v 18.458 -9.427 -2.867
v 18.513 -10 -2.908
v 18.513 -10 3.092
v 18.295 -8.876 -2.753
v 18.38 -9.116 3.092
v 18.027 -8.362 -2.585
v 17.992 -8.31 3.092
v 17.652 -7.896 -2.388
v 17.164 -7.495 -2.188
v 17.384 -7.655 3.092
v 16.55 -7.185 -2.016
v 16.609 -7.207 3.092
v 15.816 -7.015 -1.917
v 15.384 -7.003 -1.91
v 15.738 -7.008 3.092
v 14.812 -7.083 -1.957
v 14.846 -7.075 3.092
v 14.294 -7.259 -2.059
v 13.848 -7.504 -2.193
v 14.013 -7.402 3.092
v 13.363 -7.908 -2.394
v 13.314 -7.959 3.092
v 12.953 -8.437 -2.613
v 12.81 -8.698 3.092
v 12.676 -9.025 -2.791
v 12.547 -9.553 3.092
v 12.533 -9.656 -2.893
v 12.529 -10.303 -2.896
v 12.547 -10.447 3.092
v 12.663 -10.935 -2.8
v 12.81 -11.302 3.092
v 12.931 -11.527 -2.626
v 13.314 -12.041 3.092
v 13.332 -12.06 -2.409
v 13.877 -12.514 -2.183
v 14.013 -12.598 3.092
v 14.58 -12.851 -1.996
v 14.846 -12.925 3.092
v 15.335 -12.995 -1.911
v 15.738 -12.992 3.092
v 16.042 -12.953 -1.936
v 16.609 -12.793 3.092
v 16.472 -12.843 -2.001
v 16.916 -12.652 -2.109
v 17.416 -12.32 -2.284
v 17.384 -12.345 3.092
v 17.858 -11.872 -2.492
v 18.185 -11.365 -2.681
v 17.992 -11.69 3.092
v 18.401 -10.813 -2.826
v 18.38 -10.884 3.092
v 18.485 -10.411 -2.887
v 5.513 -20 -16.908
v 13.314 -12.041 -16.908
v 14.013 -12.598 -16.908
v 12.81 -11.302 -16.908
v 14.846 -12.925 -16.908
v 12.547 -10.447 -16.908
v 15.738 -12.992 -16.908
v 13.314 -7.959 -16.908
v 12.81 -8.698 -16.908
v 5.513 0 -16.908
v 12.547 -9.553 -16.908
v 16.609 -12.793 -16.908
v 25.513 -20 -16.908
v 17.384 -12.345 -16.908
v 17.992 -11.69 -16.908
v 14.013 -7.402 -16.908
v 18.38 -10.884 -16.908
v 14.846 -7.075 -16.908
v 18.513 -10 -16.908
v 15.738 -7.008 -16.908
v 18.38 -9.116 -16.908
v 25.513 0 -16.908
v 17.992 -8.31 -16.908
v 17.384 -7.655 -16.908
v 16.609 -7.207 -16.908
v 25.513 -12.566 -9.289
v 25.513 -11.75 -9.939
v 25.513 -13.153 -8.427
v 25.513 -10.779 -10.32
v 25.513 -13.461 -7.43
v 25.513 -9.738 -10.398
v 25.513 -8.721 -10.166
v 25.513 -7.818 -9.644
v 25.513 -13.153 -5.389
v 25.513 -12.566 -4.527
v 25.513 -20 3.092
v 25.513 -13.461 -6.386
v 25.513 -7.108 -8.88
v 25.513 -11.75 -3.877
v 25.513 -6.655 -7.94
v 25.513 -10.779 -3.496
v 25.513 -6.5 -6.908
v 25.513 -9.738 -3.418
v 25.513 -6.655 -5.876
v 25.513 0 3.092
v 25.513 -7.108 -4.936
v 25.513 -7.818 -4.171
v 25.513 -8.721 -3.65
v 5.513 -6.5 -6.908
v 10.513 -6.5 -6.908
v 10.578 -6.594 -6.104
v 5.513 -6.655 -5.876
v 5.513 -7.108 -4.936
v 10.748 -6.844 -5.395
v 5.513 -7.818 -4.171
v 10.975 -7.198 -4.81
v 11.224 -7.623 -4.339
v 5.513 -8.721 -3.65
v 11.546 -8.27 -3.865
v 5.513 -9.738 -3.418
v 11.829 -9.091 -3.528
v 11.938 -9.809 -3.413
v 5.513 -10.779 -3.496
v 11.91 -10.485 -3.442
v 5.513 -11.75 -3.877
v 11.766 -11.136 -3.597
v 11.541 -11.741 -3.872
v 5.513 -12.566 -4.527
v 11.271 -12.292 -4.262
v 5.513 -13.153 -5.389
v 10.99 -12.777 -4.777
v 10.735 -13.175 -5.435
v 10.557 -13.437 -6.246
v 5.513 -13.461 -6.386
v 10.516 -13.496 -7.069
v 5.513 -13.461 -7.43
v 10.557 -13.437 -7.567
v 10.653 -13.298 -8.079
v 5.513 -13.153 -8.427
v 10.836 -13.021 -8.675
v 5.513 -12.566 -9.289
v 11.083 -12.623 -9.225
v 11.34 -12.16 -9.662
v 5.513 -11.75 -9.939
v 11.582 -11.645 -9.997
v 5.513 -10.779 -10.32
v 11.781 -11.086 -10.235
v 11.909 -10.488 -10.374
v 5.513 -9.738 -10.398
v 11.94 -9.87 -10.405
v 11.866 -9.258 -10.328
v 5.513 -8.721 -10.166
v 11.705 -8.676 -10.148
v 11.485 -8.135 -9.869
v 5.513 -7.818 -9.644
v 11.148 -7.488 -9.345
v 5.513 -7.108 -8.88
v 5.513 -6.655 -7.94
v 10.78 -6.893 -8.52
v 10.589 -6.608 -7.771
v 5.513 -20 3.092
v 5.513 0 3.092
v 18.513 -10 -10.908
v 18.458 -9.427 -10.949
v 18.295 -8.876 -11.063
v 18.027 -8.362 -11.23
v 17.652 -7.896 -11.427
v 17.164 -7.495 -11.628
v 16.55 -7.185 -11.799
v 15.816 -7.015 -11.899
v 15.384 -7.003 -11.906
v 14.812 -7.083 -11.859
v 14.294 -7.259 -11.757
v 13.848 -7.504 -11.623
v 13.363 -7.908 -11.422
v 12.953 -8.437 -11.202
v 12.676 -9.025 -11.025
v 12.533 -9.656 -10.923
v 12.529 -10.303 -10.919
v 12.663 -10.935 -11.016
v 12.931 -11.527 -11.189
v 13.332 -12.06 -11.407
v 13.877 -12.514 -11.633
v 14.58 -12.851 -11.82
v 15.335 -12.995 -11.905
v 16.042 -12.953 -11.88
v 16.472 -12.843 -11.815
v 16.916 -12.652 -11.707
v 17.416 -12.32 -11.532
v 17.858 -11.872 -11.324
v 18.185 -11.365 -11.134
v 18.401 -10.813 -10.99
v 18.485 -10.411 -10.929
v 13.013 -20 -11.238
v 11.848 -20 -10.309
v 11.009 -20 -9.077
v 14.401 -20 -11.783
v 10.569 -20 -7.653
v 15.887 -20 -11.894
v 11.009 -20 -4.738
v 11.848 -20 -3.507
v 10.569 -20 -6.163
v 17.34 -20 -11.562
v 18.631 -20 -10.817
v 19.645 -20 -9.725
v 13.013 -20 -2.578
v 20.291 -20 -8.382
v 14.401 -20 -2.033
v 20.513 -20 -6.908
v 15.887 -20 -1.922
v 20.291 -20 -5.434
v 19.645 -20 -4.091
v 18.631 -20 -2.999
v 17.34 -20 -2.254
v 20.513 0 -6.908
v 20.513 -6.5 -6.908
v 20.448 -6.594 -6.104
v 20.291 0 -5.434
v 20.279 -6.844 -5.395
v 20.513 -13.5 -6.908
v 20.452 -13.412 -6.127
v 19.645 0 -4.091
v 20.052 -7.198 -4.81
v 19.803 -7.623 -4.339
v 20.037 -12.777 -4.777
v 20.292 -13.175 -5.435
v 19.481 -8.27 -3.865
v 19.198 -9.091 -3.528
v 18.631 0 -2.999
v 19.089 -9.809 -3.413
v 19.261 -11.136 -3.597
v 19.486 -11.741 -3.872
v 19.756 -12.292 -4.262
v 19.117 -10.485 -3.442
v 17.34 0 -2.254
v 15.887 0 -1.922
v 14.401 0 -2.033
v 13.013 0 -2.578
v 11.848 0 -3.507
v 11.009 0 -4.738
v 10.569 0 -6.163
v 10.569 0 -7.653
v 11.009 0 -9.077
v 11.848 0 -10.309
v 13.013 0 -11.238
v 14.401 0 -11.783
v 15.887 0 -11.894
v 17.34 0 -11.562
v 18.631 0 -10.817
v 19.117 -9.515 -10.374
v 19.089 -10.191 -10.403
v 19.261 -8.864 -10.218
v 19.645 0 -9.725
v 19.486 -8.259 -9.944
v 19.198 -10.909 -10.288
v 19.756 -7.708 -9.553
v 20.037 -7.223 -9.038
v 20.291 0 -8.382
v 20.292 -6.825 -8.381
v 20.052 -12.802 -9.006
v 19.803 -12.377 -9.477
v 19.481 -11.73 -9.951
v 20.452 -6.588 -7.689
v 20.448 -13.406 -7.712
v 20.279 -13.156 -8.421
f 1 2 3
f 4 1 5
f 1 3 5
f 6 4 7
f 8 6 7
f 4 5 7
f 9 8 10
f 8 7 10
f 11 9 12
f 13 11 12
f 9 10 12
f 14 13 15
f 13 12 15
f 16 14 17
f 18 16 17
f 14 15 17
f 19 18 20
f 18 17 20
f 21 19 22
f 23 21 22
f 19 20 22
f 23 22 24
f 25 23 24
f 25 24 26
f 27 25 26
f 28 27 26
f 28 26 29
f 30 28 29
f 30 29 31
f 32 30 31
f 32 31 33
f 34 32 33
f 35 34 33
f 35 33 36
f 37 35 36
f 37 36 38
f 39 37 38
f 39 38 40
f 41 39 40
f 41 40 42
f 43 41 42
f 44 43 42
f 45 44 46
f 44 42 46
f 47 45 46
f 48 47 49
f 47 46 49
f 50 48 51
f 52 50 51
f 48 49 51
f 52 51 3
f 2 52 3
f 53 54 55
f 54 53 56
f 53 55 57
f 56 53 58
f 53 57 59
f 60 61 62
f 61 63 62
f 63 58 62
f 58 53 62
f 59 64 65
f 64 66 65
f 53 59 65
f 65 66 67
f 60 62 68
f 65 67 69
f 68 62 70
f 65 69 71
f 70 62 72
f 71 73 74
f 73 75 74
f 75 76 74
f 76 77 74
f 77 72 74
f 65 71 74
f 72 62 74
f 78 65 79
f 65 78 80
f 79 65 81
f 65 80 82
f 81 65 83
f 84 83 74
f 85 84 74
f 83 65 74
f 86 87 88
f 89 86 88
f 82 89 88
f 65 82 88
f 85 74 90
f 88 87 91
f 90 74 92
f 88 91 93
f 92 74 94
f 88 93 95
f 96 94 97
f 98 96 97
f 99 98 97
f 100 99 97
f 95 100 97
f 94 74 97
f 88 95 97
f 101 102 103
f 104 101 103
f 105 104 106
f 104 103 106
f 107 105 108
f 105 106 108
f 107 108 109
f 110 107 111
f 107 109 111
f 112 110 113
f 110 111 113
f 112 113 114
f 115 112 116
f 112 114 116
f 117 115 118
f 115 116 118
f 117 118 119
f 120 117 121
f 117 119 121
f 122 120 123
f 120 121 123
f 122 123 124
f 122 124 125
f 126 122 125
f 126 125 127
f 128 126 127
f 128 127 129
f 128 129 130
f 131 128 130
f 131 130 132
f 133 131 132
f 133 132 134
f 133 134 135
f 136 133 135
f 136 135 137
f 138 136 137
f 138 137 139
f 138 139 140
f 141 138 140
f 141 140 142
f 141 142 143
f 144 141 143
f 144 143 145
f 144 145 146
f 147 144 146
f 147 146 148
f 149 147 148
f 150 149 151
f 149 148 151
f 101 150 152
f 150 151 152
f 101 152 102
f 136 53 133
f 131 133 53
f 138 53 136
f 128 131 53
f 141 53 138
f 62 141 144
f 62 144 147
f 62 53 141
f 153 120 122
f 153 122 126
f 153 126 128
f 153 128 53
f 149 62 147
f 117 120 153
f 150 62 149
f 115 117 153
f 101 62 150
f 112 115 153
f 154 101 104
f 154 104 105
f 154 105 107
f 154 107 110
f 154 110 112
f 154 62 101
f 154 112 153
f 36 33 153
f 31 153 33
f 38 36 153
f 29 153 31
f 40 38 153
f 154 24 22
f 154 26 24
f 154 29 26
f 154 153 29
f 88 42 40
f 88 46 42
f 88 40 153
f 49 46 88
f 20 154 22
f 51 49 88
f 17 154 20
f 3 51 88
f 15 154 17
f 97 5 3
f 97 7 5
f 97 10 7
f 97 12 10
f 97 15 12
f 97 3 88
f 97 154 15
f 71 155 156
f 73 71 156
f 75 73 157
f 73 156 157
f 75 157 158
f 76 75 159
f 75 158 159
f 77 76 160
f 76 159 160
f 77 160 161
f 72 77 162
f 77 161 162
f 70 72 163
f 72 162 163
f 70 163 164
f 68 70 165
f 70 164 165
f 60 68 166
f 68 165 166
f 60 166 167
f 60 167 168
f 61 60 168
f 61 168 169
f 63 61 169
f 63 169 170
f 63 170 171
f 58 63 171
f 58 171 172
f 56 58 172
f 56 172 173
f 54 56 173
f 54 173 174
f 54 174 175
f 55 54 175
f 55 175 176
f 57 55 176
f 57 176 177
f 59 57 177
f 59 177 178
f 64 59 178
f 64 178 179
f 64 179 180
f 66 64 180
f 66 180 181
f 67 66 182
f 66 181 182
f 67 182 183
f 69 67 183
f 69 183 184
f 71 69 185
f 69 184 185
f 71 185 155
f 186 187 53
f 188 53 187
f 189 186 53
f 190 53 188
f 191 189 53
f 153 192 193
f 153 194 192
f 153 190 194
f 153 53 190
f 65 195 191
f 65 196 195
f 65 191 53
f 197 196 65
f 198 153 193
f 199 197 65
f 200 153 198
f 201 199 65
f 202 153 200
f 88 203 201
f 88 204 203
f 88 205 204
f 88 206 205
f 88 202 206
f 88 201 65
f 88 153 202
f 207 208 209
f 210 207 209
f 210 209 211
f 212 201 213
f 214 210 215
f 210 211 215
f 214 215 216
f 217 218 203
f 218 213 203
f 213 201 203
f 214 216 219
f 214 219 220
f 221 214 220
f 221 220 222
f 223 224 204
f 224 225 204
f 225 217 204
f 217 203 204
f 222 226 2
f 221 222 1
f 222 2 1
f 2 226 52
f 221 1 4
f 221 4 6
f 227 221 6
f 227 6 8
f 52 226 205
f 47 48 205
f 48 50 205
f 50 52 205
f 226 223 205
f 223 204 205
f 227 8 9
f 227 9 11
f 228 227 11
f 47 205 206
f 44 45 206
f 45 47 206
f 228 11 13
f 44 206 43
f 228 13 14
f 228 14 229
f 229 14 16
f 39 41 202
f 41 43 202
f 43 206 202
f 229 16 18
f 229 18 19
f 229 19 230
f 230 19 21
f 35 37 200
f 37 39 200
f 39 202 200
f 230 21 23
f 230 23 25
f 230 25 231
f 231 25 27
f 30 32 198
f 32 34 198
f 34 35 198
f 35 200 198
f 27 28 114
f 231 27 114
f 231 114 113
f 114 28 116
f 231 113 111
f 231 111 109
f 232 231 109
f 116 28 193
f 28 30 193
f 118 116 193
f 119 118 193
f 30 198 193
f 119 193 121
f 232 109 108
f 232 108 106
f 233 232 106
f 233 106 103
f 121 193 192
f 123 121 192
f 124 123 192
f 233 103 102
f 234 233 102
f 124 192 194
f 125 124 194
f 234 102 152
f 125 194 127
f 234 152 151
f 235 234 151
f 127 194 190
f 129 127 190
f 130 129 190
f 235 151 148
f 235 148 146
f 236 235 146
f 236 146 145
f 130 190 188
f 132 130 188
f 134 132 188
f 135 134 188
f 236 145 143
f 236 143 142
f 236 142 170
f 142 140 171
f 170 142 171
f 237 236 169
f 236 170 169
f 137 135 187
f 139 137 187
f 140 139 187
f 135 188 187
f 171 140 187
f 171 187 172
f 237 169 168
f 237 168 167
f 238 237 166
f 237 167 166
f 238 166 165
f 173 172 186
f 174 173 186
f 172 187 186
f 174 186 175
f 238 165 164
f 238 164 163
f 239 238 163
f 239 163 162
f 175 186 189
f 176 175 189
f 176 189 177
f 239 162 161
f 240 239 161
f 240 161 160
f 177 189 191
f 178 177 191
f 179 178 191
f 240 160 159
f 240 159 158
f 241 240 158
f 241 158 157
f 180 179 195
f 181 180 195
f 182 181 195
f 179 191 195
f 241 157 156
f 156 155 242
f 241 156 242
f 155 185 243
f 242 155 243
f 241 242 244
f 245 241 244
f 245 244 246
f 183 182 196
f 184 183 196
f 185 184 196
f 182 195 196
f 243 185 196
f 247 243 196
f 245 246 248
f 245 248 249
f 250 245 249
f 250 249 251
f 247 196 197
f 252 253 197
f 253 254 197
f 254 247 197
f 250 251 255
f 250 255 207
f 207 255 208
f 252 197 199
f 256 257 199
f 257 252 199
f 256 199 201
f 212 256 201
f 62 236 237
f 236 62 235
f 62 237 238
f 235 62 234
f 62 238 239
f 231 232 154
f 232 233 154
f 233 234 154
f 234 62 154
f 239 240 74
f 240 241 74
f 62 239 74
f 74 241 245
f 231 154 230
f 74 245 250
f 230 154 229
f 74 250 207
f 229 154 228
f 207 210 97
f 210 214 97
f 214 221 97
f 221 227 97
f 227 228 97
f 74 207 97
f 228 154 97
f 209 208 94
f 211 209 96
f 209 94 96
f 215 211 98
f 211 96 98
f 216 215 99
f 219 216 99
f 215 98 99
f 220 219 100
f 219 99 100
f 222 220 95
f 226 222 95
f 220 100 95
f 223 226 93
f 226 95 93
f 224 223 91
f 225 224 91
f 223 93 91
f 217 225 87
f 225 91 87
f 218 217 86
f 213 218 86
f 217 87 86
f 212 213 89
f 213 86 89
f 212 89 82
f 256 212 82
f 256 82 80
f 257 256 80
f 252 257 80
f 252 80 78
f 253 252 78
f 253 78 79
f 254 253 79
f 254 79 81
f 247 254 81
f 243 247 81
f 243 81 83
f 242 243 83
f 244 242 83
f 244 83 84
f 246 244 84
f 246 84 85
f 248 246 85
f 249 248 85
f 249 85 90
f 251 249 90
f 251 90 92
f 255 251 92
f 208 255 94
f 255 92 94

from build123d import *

# Parameters (mm, degrees)
F0_W     = 20
F0_H     = 20
F1_DEPTH = 20
F2_R     = 3
F3_DEPTH = 25
F4_R     = 3.5
F5_DEPTH = 25
F6_R     = 5
F7_DEPTH = 25


with BuildPart() as f1:
    # F0 (on Front) → F1 (new body)
    with BuildSketch(Plane.XZ):
        with Locations((15.513396, -6.90791)):
            Rectangle(F0_W, F0_H)
    extrude(amount=F1_DEPTH)

    # F2 (on face) → F3 (cut)
    with BuildSketch(Plane.XY.offset(3.09209)):
        with Locations((15.513396, -10)):
            Circle(F2_R)
    extrude(amount=-F3_DEPTH, mode=Mode.SUBTRACT)

    # F4 (on face) → F5 (cut)
    with BuildSketch(Plane.YZ.offset(25.513396)):
        with Locations((-10, -6.90791)):
            Circle(F4_R)
    extrude(amount=-F5_DEPTH, mode=Mode.SUBTRACT)

    # F6 (on face) → F7 (cut)
    with BuildSketch(Plane.XZ.offset(20)):
        with Locations((15.513396, -6.90791)):
            Circle(F6_R)
    extrude(amount=-F7_DEPTH, mode=Mode.SUBTRACT)


solid = f1.part
